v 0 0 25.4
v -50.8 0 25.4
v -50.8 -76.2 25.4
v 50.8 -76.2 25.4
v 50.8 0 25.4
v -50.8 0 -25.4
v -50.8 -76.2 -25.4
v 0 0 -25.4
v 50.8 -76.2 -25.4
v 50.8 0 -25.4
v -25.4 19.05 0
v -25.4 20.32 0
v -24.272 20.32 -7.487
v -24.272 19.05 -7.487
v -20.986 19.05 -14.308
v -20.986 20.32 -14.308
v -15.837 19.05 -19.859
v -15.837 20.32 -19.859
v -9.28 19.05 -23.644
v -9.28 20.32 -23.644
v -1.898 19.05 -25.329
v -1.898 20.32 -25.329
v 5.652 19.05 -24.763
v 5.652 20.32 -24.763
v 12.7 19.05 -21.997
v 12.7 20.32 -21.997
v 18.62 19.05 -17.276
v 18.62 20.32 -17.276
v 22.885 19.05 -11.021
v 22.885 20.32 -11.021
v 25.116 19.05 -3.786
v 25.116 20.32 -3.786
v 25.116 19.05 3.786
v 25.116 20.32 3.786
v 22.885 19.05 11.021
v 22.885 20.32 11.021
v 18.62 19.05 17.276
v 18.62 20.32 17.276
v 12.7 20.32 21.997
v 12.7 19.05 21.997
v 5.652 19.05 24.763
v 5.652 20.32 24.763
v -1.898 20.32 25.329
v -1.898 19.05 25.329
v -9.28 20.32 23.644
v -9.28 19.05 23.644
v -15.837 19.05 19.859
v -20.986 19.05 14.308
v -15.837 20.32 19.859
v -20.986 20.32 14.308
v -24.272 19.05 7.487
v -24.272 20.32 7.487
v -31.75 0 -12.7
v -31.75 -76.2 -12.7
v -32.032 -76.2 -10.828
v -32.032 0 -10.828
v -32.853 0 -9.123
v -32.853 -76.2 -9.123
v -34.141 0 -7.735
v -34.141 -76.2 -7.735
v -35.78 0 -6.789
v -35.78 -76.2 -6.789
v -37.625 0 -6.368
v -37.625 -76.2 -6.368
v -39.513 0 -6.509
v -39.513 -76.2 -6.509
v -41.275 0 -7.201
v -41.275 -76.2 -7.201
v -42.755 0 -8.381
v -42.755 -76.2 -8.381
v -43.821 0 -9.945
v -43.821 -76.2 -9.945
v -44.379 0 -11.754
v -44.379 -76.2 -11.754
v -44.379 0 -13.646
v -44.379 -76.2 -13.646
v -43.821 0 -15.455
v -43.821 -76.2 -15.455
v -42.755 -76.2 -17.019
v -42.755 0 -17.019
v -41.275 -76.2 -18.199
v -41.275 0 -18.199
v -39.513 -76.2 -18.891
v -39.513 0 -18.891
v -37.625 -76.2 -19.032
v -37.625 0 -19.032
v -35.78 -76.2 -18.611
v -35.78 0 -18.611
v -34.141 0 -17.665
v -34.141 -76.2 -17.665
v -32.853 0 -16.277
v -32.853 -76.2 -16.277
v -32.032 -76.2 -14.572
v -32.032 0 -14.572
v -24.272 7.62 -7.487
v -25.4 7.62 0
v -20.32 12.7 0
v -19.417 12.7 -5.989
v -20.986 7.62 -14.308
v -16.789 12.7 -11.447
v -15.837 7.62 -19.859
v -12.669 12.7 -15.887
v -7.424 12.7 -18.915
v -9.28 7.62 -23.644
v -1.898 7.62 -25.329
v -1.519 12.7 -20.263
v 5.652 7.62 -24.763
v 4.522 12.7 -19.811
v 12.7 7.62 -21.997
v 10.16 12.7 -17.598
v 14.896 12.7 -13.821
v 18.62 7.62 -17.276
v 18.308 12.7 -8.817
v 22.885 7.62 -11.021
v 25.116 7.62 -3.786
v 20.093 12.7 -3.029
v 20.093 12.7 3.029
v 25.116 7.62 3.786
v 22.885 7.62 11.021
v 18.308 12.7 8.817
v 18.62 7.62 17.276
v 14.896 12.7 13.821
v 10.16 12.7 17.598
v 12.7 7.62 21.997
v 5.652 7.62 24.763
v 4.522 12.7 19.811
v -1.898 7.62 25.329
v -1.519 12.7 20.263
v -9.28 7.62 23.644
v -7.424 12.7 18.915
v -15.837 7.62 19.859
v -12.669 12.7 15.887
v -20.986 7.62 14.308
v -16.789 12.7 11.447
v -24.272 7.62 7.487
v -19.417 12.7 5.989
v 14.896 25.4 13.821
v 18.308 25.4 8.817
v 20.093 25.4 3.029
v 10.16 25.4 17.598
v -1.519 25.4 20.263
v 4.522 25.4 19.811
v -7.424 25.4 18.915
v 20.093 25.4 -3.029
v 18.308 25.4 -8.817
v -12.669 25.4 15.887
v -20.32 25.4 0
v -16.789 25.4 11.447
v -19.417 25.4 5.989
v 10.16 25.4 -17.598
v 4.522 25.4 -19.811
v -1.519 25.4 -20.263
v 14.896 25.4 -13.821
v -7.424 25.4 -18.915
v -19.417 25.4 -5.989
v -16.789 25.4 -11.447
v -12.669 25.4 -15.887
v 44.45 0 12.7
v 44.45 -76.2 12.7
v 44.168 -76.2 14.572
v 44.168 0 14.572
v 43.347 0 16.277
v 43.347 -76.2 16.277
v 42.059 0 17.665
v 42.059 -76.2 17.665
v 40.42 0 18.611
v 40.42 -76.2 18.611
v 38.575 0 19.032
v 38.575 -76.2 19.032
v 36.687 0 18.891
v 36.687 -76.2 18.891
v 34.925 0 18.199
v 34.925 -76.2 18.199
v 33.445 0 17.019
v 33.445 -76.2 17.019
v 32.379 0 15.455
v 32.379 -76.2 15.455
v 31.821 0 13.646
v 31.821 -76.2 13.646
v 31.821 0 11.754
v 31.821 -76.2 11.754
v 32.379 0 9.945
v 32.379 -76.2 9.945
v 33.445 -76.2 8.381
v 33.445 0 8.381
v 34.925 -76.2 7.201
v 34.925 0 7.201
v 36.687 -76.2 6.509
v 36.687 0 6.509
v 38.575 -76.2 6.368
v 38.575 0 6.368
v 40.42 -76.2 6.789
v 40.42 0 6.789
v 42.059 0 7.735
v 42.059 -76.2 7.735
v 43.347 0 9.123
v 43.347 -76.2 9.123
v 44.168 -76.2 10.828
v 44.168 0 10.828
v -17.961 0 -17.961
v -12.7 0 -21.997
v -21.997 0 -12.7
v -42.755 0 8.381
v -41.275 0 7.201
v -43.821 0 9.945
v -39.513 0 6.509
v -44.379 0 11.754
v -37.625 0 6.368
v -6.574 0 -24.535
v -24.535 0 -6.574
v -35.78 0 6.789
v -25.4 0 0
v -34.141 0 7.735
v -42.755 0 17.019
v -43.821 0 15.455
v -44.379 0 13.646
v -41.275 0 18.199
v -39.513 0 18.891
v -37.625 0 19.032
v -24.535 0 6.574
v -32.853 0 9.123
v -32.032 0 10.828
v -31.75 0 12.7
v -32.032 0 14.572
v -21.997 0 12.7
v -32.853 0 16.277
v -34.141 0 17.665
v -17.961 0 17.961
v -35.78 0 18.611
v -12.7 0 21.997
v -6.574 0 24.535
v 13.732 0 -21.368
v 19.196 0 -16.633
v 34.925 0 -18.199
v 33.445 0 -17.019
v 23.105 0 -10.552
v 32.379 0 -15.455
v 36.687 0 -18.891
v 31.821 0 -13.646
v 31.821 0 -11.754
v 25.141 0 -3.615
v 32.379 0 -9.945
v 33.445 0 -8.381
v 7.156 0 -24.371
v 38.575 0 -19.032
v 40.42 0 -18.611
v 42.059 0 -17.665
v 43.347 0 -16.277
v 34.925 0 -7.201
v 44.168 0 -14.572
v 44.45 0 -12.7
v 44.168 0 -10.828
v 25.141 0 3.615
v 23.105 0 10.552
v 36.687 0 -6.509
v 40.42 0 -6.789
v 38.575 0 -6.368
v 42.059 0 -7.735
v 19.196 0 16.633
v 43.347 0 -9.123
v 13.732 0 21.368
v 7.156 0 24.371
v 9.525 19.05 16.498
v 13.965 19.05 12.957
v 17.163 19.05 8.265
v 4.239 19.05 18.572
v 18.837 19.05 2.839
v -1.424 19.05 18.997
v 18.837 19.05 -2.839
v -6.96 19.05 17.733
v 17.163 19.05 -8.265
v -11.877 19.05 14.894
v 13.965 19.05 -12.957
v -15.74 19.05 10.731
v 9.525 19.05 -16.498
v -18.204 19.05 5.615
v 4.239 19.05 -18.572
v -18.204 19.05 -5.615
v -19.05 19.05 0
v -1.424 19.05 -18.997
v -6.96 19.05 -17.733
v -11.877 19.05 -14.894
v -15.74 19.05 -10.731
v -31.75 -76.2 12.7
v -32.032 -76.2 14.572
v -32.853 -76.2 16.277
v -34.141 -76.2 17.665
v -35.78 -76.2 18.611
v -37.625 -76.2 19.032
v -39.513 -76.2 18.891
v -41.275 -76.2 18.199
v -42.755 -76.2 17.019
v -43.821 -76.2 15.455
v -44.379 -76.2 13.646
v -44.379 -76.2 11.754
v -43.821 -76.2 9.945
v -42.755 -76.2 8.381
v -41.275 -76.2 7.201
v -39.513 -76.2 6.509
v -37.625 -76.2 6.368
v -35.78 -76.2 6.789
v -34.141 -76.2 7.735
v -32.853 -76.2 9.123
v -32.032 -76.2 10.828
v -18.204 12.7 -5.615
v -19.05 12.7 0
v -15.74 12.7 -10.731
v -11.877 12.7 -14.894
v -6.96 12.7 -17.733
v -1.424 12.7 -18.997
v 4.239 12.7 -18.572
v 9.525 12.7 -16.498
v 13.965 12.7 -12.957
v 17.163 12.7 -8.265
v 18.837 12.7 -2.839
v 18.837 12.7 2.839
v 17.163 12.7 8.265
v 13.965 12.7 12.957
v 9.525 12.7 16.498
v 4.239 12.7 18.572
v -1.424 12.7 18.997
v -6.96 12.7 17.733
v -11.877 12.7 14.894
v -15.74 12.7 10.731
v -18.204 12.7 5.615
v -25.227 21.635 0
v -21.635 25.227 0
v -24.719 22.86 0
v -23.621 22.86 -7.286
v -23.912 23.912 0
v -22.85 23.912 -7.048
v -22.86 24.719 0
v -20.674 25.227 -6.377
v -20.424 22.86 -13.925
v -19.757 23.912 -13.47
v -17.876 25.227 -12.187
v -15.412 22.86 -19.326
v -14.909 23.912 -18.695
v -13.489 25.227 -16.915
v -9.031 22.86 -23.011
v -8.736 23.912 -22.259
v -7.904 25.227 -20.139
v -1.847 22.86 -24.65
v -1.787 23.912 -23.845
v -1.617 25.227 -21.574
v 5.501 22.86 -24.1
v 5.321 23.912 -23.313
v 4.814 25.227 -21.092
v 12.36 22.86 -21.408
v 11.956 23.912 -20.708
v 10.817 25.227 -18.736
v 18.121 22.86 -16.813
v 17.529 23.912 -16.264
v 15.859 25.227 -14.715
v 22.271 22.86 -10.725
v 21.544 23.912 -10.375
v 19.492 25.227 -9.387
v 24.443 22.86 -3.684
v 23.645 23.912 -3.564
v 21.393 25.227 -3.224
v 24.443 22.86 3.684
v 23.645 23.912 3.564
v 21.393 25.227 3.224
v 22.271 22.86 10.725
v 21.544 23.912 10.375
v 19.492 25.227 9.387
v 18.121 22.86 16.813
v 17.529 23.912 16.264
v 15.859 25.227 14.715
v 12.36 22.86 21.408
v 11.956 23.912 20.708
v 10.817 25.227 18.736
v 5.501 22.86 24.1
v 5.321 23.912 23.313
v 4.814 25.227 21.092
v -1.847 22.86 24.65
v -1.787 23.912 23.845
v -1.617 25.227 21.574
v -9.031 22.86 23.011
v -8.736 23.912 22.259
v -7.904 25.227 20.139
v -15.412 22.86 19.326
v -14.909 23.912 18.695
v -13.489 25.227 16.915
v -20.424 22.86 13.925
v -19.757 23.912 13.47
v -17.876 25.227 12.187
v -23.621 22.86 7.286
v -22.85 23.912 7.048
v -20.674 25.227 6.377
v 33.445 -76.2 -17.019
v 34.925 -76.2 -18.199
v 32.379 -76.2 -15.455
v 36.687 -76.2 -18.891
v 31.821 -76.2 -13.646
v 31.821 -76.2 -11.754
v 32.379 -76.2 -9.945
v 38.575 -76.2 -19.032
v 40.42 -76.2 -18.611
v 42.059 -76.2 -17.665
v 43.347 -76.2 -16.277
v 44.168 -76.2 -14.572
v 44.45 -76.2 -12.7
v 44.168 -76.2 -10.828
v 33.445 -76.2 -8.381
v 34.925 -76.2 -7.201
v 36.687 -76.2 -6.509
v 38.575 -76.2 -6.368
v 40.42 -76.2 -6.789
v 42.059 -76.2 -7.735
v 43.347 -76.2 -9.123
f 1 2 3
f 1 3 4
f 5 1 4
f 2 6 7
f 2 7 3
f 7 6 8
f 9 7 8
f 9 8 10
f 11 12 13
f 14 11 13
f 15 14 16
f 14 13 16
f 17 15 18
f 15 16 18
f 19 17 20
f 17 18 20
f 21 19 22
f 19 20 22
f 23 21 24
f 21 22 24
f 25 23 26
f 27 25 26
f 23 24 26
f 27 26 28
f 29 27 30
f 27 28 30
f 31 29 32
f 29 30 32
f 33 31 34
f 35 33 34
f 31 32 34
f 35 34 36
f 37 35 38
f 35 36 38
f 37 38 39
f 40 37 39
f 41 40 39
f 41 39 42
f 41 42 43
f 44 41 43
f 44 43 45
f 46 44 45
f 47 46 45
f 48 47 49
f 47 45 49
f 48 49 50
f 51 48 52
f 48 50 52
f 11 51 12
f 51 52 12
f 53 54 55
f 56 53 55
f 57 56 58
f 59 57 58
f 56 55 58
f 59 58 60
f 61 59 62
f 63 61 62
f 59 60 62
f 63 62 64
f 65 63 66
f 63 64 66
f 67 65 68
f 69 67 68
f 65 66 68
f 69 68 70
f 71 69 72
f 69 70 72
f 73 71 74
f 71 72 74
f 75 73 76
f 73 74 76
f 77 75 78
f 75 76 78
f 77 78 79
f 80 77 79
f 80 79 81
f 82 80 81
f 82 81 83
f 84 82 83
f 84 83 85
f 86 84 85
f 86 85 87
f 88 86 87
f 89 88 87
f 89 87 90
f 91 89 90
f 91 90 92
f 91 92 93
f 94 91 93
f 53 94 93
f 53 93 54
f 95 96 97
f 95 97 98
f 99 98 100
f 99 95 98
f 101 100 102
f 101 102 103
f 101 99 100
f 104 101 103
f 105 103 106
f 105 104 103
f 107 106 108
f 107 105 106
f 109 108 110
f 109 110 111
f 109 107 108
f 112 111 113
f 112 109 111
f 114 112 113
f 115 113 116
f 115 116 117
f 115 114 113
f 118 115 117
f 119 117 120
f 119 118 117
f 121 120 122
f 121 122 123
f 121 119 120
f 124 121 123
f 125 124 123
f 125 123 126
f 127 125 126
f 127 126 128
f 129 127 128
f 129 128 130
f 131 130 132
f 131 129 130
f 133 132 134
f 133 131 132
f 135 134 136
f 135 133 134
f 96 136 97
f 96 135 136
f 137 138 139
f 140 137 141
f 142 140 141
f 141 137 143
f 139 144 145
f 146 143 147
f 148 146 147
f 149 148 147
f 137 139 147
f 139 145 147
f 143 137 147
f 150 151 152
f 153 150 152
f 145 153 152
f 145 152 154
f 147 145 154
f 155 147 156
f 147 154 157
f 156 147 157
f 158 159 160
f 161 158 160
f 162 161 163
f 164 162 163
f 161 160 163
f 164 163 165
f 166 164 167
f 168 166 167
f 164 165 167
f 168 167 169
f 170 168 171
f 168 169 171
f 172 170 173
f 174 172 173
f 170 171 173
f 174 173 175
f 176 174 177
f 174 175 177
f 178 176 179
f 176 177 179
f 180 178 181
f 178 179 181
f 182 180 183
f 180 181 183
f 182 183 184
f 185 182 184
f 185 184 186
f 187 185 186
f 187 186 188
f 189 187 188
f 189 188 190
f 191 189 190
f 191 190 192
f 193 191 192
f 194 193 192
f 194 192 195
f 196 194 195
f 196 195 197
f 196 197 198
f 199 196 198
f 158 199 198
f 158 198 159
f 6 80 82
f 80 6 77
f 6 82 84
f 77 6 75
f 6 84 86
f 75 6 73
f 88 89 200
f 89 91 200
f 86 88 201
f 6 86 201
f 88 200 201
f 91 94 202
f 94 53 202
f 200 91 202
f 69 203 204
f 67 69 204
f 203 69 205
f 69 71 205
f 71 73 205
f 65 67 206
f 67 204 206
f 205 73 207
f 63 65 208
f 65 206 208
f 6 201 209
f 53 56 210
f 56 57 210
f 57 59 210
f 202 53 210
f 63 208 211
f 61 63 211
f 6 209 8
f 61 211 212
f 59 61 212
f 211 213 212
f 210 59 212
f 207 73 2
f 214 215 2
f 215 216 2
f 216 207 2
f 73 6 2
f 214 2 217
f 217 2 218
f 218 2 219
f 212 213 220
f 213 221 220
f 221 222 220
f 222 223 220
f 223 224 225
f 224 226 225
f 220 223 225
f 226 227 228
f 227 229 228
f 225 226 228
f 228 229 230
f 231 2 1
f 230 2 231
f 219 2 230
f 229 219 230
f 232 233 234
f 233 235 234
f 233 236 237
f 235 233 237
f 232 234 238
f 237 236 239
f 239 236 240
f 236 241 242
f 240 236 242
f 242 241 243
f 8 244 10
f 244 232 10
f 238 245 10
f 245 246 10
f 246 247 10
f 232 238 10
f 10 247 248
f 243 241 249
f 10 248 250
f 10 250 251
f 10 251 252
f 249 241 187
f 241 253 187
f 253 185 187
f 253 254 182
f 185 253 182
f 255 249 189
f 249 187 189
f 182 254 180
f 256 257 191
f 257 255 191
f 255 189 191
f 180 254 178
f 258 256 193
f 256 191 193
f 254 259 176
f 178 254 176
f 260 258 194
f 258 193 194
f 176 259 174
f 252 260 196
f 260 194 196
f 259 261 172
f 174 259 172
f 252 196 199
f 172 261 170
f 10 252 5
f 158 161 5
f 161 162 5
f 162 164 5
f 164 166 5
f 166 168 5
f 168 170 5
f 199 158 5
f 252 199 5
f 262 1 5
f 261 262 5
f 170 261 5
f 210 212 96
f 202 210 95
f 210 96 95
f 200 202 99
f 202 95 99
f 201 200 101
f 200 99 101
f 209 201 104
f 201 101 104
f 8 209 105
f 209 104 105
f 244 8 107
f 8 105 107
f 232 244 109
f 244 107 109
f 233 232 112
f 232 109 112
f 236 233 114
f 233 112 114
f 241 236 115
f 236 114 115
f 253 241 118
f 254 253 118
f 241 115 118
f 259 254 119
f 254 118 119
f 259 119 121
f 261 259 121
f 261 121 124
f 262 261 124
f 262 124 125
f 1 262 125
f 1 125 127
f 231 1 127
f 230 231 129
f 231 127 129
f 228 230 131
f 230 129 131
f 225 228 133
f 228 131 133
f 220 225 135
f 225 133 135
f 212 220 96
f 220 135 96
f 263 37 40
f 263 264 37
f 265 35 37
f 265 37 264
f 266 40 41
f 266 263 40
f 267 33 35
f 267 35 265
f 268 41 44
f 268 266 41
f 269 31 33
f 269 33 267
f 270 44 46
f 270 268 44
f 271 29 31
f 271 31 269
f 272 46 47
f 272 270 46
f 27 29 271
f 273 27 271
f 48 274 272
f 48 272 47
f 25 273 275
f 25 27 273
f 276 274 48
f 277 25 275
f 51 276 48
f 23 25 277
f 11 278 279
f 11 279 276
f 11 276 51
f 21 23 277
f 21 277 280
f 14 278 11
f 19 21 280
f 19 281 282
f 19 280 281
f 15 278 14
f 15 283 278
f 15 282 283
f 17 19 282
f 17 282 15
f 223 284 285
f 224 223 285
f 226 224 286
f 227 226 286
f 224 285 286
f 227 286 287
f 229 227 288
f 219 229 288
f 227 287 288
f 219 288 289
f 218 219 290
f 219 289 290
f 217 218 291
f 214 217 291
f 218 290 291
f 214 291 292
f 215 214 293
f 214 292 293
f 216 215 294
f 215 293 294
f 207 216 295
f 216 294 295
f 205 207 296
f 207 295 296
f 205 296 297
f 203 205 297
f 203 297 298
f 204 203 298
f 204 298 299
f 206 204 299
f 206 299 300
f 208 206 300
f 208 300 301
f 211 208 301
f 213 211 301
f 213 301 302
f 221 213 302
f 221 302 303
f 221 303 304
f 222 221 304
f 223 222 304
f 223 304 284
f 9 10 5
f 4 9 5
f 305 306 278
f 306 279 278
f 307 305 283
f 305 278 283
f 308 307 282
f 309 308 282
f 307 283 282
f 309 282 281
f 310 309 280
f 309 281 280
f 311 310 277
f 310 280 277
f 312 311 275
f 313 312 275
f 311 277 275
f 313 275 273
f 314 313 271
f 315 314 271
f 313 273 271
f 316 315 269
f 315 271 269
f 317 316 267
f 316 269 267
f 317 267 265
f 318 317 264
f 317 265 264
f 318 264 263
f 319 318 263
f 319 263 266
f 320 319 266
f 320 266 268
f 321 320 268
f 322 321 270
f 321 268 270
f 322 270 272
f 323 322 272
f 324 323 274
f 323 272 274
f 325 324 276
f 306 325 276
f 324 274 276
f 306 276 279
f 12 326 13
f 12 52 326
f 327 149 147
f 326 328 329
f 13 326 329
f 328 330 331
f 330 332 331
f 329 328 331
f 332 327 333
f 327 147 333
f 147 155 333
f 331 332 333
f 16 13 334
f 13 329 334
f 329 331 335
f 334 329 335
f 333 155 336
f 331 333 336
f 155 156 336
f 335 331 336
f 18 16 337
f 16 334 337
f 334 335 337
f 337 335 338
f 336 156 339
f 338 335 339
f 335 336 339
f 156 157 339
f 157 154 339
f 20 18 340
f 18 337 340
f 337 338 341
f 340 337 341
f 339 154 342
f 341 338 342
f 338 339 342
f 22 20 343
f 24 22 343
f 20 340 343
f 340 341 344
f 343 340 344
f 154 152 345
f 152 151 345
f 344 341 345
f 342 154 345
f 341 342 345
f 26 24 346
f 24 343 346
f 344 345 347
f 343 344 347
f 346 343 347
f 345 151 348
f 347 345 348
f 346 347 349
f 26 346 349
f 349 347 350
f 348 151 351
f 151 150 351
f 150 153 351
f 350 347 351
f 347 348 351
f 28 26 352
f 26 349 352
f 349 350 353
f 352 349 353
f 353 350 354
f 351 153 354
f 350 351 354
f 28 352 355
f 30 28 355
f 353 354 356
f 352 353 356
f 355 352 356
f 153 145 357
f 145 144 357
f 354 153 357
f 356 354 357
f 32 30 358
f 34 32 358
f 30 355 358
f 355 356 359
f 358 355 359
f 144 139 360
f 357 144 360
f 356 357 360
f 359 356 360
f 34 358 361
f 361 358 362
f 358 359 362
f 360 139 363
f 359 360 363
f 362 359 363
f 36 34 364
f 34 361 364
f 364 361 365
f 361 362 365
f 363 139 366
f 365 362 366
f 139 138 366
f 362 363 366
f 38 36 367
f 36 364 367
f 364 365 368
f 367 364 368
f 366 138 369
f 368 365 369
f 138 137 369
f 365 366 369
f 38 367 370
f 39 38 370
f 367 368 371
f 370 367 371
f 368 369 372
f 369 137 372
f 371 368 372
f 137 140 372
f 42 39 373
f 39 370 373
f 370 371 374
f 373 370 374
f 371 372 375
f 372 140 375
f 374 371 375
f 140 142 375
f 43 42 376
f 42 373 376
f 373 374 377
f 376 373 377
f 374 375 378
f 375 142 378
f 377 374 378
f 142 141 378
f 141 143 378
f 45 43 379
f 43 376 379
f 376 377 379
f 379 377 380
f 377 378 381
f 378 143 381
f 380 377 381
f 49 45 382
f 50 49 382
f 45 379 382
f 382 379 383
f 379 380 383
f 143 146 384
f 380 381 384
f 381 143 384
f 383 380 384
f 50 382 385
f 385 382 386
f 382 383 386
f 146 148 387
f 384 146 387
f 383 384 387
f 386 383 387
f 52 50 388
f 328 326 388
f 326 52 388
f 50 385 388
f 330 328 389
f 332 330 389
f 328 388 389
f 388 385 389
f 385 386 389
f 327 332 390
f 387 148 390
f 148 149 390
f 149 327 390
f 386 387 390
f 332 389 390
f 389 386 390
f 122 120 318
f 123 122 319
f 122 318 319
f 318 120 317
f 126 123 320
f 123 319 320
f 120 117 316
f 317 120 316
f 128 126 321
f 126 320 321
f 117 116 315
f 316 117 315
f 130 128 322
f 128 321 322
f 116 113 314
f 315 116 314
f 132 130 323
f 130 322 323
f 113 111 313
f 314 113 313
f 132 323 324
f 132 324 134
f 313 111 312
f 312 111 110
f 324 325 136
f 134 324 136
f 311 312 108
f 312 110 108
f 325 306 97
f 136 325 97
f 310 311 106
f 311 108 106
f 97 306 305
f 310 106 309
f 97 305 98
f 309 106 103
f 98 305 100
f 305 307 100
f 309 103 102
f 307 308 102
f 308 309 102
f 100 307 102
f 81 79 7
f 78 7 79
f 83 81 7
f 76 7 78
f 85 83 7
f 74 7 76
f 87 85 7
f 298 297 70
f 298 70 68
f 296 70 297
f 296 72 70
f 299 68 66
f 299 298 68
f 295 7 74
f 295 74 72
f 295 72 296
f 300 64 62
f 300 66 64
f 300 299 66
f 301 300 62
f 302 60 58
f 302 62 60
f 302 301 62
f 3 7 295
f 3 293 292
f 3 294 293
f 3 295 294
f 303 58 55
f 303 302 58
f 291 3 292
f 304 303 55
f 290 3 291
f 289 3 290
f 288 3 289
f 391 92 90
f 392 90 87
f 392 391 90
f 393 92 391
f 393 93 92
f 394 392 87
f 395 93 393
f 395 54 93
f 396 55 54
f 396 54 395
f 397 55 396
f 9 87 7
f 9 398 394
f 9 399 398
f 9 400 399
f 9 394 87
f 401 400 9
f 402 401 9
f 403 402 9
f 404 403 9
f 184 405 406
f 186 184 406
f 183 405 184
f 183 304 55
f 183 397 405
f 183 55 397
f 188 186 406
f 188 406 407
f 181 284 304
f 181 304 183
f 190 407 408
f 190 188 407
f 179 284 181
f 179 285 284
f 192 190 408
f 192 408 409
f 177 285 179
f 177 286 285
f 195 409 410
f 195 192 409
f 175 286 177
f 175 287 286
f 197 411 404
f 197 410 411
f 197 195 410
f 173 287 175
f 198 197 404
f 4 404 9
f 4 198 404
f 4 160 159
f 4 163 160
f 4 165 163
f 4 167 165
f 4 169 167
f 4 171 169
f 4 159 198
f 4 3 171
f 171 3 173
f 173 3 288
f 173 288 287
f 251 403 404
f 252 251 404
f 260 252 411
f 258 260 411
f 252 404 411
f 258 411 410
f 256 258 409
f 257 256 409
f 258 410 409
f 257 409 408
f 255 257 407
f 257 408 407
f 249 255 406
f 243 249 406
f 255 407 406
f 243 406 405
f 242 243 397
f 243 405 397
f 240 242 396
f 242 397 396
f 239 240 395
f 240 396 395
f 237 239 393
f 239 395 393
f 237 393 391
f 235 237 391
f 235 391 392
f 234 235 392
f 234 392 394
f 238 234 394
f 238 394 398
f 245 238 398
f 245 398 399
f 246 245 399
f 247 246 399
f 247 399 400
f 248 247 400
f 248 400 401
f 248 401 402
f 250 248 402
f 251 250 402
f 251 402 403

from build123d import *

# Parameters (mm, degrees)
F0_W     = 101.6
F0_H     = 50.8
F1_DEPTH = 76.2
F2_R     = 6.35
F3_DEPTH = 76.201
F4_W     = 25.4
F4_H     = 25.4
F6_W     = 6.35
F6_H     = 6.35
F8_R     = 5.08
F9_SIZE  = 5.08


with BuildPart() as f1:
    # F0 (on Front) → F1 (new body)
    with BuildSketch(Plane.XZ):
        Rectangle(F0_W, F0_H)
    extrude(amount=F1_DEPTH)

    # F2 (on face) → F3 (cut, through all)
    with BuildSketch(Plane.XZ.offset(76.2)):
        with Locations((-38.1, 12.7)):
            Circle(F2_R)
        with Locations((-38.1, -12.7)):
            Circle(F2_R)
        with Locations((38.1, 12.7)):
            Circle(F2_R)
        with Locations((38.1, -12.7)):
            Circle(F2_R)
    extrude(amount=-F3_DEPTH, mode=Mode.SUBTRACT)

    # F4 (on Top) → F5 (revolve)
    with BuildSketch(Plane.XY):
        with Locations((-12.7, 12.7)):
            Rectangle(F4_W, F4_H)
    revolve(axis=Axis((0, 12.7, 0), (0, -1, 0)))

    # F6 (on Top) → F7 (revolve, cut)
    with BuildSketch(Plane.XY):
        with Locations((-22.225, 15.875)):
            Rectangle(F6_W, F6_H)
    revolve(axis=Axis((0, -10.316852, 0), (0, -1, 0)), mode=Mode.SUBTRACT)

    # F8
    f8_edges = [f1.edges().sort_by_distance(p)[0] for p in [
        (25.4, 25.4, 0),
    ]]
    fillet(f8_edges, radius=F8_R)

    # F9
    f9_edges = [f1.edges().sort_by_distance(p)[0] for p in [
        (25.4, 12.7, 0),
    ]]
    chamfer(f9_edges, length=F9_SIZE)


solid = f1.part
